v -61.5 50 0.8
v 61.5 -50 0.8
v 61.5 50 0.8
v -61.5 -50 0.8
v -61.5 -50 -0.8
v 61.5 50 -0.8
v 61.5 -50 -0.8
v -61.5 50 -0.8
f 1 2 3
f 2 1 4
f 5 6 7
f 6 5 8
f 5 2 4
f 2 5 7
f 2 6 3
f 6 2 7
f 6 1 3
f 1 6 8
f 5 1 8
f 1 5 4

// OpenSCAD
translate([-61.5, -50, -0.8])
    cube([123.0, 100.0, 1.6]);
